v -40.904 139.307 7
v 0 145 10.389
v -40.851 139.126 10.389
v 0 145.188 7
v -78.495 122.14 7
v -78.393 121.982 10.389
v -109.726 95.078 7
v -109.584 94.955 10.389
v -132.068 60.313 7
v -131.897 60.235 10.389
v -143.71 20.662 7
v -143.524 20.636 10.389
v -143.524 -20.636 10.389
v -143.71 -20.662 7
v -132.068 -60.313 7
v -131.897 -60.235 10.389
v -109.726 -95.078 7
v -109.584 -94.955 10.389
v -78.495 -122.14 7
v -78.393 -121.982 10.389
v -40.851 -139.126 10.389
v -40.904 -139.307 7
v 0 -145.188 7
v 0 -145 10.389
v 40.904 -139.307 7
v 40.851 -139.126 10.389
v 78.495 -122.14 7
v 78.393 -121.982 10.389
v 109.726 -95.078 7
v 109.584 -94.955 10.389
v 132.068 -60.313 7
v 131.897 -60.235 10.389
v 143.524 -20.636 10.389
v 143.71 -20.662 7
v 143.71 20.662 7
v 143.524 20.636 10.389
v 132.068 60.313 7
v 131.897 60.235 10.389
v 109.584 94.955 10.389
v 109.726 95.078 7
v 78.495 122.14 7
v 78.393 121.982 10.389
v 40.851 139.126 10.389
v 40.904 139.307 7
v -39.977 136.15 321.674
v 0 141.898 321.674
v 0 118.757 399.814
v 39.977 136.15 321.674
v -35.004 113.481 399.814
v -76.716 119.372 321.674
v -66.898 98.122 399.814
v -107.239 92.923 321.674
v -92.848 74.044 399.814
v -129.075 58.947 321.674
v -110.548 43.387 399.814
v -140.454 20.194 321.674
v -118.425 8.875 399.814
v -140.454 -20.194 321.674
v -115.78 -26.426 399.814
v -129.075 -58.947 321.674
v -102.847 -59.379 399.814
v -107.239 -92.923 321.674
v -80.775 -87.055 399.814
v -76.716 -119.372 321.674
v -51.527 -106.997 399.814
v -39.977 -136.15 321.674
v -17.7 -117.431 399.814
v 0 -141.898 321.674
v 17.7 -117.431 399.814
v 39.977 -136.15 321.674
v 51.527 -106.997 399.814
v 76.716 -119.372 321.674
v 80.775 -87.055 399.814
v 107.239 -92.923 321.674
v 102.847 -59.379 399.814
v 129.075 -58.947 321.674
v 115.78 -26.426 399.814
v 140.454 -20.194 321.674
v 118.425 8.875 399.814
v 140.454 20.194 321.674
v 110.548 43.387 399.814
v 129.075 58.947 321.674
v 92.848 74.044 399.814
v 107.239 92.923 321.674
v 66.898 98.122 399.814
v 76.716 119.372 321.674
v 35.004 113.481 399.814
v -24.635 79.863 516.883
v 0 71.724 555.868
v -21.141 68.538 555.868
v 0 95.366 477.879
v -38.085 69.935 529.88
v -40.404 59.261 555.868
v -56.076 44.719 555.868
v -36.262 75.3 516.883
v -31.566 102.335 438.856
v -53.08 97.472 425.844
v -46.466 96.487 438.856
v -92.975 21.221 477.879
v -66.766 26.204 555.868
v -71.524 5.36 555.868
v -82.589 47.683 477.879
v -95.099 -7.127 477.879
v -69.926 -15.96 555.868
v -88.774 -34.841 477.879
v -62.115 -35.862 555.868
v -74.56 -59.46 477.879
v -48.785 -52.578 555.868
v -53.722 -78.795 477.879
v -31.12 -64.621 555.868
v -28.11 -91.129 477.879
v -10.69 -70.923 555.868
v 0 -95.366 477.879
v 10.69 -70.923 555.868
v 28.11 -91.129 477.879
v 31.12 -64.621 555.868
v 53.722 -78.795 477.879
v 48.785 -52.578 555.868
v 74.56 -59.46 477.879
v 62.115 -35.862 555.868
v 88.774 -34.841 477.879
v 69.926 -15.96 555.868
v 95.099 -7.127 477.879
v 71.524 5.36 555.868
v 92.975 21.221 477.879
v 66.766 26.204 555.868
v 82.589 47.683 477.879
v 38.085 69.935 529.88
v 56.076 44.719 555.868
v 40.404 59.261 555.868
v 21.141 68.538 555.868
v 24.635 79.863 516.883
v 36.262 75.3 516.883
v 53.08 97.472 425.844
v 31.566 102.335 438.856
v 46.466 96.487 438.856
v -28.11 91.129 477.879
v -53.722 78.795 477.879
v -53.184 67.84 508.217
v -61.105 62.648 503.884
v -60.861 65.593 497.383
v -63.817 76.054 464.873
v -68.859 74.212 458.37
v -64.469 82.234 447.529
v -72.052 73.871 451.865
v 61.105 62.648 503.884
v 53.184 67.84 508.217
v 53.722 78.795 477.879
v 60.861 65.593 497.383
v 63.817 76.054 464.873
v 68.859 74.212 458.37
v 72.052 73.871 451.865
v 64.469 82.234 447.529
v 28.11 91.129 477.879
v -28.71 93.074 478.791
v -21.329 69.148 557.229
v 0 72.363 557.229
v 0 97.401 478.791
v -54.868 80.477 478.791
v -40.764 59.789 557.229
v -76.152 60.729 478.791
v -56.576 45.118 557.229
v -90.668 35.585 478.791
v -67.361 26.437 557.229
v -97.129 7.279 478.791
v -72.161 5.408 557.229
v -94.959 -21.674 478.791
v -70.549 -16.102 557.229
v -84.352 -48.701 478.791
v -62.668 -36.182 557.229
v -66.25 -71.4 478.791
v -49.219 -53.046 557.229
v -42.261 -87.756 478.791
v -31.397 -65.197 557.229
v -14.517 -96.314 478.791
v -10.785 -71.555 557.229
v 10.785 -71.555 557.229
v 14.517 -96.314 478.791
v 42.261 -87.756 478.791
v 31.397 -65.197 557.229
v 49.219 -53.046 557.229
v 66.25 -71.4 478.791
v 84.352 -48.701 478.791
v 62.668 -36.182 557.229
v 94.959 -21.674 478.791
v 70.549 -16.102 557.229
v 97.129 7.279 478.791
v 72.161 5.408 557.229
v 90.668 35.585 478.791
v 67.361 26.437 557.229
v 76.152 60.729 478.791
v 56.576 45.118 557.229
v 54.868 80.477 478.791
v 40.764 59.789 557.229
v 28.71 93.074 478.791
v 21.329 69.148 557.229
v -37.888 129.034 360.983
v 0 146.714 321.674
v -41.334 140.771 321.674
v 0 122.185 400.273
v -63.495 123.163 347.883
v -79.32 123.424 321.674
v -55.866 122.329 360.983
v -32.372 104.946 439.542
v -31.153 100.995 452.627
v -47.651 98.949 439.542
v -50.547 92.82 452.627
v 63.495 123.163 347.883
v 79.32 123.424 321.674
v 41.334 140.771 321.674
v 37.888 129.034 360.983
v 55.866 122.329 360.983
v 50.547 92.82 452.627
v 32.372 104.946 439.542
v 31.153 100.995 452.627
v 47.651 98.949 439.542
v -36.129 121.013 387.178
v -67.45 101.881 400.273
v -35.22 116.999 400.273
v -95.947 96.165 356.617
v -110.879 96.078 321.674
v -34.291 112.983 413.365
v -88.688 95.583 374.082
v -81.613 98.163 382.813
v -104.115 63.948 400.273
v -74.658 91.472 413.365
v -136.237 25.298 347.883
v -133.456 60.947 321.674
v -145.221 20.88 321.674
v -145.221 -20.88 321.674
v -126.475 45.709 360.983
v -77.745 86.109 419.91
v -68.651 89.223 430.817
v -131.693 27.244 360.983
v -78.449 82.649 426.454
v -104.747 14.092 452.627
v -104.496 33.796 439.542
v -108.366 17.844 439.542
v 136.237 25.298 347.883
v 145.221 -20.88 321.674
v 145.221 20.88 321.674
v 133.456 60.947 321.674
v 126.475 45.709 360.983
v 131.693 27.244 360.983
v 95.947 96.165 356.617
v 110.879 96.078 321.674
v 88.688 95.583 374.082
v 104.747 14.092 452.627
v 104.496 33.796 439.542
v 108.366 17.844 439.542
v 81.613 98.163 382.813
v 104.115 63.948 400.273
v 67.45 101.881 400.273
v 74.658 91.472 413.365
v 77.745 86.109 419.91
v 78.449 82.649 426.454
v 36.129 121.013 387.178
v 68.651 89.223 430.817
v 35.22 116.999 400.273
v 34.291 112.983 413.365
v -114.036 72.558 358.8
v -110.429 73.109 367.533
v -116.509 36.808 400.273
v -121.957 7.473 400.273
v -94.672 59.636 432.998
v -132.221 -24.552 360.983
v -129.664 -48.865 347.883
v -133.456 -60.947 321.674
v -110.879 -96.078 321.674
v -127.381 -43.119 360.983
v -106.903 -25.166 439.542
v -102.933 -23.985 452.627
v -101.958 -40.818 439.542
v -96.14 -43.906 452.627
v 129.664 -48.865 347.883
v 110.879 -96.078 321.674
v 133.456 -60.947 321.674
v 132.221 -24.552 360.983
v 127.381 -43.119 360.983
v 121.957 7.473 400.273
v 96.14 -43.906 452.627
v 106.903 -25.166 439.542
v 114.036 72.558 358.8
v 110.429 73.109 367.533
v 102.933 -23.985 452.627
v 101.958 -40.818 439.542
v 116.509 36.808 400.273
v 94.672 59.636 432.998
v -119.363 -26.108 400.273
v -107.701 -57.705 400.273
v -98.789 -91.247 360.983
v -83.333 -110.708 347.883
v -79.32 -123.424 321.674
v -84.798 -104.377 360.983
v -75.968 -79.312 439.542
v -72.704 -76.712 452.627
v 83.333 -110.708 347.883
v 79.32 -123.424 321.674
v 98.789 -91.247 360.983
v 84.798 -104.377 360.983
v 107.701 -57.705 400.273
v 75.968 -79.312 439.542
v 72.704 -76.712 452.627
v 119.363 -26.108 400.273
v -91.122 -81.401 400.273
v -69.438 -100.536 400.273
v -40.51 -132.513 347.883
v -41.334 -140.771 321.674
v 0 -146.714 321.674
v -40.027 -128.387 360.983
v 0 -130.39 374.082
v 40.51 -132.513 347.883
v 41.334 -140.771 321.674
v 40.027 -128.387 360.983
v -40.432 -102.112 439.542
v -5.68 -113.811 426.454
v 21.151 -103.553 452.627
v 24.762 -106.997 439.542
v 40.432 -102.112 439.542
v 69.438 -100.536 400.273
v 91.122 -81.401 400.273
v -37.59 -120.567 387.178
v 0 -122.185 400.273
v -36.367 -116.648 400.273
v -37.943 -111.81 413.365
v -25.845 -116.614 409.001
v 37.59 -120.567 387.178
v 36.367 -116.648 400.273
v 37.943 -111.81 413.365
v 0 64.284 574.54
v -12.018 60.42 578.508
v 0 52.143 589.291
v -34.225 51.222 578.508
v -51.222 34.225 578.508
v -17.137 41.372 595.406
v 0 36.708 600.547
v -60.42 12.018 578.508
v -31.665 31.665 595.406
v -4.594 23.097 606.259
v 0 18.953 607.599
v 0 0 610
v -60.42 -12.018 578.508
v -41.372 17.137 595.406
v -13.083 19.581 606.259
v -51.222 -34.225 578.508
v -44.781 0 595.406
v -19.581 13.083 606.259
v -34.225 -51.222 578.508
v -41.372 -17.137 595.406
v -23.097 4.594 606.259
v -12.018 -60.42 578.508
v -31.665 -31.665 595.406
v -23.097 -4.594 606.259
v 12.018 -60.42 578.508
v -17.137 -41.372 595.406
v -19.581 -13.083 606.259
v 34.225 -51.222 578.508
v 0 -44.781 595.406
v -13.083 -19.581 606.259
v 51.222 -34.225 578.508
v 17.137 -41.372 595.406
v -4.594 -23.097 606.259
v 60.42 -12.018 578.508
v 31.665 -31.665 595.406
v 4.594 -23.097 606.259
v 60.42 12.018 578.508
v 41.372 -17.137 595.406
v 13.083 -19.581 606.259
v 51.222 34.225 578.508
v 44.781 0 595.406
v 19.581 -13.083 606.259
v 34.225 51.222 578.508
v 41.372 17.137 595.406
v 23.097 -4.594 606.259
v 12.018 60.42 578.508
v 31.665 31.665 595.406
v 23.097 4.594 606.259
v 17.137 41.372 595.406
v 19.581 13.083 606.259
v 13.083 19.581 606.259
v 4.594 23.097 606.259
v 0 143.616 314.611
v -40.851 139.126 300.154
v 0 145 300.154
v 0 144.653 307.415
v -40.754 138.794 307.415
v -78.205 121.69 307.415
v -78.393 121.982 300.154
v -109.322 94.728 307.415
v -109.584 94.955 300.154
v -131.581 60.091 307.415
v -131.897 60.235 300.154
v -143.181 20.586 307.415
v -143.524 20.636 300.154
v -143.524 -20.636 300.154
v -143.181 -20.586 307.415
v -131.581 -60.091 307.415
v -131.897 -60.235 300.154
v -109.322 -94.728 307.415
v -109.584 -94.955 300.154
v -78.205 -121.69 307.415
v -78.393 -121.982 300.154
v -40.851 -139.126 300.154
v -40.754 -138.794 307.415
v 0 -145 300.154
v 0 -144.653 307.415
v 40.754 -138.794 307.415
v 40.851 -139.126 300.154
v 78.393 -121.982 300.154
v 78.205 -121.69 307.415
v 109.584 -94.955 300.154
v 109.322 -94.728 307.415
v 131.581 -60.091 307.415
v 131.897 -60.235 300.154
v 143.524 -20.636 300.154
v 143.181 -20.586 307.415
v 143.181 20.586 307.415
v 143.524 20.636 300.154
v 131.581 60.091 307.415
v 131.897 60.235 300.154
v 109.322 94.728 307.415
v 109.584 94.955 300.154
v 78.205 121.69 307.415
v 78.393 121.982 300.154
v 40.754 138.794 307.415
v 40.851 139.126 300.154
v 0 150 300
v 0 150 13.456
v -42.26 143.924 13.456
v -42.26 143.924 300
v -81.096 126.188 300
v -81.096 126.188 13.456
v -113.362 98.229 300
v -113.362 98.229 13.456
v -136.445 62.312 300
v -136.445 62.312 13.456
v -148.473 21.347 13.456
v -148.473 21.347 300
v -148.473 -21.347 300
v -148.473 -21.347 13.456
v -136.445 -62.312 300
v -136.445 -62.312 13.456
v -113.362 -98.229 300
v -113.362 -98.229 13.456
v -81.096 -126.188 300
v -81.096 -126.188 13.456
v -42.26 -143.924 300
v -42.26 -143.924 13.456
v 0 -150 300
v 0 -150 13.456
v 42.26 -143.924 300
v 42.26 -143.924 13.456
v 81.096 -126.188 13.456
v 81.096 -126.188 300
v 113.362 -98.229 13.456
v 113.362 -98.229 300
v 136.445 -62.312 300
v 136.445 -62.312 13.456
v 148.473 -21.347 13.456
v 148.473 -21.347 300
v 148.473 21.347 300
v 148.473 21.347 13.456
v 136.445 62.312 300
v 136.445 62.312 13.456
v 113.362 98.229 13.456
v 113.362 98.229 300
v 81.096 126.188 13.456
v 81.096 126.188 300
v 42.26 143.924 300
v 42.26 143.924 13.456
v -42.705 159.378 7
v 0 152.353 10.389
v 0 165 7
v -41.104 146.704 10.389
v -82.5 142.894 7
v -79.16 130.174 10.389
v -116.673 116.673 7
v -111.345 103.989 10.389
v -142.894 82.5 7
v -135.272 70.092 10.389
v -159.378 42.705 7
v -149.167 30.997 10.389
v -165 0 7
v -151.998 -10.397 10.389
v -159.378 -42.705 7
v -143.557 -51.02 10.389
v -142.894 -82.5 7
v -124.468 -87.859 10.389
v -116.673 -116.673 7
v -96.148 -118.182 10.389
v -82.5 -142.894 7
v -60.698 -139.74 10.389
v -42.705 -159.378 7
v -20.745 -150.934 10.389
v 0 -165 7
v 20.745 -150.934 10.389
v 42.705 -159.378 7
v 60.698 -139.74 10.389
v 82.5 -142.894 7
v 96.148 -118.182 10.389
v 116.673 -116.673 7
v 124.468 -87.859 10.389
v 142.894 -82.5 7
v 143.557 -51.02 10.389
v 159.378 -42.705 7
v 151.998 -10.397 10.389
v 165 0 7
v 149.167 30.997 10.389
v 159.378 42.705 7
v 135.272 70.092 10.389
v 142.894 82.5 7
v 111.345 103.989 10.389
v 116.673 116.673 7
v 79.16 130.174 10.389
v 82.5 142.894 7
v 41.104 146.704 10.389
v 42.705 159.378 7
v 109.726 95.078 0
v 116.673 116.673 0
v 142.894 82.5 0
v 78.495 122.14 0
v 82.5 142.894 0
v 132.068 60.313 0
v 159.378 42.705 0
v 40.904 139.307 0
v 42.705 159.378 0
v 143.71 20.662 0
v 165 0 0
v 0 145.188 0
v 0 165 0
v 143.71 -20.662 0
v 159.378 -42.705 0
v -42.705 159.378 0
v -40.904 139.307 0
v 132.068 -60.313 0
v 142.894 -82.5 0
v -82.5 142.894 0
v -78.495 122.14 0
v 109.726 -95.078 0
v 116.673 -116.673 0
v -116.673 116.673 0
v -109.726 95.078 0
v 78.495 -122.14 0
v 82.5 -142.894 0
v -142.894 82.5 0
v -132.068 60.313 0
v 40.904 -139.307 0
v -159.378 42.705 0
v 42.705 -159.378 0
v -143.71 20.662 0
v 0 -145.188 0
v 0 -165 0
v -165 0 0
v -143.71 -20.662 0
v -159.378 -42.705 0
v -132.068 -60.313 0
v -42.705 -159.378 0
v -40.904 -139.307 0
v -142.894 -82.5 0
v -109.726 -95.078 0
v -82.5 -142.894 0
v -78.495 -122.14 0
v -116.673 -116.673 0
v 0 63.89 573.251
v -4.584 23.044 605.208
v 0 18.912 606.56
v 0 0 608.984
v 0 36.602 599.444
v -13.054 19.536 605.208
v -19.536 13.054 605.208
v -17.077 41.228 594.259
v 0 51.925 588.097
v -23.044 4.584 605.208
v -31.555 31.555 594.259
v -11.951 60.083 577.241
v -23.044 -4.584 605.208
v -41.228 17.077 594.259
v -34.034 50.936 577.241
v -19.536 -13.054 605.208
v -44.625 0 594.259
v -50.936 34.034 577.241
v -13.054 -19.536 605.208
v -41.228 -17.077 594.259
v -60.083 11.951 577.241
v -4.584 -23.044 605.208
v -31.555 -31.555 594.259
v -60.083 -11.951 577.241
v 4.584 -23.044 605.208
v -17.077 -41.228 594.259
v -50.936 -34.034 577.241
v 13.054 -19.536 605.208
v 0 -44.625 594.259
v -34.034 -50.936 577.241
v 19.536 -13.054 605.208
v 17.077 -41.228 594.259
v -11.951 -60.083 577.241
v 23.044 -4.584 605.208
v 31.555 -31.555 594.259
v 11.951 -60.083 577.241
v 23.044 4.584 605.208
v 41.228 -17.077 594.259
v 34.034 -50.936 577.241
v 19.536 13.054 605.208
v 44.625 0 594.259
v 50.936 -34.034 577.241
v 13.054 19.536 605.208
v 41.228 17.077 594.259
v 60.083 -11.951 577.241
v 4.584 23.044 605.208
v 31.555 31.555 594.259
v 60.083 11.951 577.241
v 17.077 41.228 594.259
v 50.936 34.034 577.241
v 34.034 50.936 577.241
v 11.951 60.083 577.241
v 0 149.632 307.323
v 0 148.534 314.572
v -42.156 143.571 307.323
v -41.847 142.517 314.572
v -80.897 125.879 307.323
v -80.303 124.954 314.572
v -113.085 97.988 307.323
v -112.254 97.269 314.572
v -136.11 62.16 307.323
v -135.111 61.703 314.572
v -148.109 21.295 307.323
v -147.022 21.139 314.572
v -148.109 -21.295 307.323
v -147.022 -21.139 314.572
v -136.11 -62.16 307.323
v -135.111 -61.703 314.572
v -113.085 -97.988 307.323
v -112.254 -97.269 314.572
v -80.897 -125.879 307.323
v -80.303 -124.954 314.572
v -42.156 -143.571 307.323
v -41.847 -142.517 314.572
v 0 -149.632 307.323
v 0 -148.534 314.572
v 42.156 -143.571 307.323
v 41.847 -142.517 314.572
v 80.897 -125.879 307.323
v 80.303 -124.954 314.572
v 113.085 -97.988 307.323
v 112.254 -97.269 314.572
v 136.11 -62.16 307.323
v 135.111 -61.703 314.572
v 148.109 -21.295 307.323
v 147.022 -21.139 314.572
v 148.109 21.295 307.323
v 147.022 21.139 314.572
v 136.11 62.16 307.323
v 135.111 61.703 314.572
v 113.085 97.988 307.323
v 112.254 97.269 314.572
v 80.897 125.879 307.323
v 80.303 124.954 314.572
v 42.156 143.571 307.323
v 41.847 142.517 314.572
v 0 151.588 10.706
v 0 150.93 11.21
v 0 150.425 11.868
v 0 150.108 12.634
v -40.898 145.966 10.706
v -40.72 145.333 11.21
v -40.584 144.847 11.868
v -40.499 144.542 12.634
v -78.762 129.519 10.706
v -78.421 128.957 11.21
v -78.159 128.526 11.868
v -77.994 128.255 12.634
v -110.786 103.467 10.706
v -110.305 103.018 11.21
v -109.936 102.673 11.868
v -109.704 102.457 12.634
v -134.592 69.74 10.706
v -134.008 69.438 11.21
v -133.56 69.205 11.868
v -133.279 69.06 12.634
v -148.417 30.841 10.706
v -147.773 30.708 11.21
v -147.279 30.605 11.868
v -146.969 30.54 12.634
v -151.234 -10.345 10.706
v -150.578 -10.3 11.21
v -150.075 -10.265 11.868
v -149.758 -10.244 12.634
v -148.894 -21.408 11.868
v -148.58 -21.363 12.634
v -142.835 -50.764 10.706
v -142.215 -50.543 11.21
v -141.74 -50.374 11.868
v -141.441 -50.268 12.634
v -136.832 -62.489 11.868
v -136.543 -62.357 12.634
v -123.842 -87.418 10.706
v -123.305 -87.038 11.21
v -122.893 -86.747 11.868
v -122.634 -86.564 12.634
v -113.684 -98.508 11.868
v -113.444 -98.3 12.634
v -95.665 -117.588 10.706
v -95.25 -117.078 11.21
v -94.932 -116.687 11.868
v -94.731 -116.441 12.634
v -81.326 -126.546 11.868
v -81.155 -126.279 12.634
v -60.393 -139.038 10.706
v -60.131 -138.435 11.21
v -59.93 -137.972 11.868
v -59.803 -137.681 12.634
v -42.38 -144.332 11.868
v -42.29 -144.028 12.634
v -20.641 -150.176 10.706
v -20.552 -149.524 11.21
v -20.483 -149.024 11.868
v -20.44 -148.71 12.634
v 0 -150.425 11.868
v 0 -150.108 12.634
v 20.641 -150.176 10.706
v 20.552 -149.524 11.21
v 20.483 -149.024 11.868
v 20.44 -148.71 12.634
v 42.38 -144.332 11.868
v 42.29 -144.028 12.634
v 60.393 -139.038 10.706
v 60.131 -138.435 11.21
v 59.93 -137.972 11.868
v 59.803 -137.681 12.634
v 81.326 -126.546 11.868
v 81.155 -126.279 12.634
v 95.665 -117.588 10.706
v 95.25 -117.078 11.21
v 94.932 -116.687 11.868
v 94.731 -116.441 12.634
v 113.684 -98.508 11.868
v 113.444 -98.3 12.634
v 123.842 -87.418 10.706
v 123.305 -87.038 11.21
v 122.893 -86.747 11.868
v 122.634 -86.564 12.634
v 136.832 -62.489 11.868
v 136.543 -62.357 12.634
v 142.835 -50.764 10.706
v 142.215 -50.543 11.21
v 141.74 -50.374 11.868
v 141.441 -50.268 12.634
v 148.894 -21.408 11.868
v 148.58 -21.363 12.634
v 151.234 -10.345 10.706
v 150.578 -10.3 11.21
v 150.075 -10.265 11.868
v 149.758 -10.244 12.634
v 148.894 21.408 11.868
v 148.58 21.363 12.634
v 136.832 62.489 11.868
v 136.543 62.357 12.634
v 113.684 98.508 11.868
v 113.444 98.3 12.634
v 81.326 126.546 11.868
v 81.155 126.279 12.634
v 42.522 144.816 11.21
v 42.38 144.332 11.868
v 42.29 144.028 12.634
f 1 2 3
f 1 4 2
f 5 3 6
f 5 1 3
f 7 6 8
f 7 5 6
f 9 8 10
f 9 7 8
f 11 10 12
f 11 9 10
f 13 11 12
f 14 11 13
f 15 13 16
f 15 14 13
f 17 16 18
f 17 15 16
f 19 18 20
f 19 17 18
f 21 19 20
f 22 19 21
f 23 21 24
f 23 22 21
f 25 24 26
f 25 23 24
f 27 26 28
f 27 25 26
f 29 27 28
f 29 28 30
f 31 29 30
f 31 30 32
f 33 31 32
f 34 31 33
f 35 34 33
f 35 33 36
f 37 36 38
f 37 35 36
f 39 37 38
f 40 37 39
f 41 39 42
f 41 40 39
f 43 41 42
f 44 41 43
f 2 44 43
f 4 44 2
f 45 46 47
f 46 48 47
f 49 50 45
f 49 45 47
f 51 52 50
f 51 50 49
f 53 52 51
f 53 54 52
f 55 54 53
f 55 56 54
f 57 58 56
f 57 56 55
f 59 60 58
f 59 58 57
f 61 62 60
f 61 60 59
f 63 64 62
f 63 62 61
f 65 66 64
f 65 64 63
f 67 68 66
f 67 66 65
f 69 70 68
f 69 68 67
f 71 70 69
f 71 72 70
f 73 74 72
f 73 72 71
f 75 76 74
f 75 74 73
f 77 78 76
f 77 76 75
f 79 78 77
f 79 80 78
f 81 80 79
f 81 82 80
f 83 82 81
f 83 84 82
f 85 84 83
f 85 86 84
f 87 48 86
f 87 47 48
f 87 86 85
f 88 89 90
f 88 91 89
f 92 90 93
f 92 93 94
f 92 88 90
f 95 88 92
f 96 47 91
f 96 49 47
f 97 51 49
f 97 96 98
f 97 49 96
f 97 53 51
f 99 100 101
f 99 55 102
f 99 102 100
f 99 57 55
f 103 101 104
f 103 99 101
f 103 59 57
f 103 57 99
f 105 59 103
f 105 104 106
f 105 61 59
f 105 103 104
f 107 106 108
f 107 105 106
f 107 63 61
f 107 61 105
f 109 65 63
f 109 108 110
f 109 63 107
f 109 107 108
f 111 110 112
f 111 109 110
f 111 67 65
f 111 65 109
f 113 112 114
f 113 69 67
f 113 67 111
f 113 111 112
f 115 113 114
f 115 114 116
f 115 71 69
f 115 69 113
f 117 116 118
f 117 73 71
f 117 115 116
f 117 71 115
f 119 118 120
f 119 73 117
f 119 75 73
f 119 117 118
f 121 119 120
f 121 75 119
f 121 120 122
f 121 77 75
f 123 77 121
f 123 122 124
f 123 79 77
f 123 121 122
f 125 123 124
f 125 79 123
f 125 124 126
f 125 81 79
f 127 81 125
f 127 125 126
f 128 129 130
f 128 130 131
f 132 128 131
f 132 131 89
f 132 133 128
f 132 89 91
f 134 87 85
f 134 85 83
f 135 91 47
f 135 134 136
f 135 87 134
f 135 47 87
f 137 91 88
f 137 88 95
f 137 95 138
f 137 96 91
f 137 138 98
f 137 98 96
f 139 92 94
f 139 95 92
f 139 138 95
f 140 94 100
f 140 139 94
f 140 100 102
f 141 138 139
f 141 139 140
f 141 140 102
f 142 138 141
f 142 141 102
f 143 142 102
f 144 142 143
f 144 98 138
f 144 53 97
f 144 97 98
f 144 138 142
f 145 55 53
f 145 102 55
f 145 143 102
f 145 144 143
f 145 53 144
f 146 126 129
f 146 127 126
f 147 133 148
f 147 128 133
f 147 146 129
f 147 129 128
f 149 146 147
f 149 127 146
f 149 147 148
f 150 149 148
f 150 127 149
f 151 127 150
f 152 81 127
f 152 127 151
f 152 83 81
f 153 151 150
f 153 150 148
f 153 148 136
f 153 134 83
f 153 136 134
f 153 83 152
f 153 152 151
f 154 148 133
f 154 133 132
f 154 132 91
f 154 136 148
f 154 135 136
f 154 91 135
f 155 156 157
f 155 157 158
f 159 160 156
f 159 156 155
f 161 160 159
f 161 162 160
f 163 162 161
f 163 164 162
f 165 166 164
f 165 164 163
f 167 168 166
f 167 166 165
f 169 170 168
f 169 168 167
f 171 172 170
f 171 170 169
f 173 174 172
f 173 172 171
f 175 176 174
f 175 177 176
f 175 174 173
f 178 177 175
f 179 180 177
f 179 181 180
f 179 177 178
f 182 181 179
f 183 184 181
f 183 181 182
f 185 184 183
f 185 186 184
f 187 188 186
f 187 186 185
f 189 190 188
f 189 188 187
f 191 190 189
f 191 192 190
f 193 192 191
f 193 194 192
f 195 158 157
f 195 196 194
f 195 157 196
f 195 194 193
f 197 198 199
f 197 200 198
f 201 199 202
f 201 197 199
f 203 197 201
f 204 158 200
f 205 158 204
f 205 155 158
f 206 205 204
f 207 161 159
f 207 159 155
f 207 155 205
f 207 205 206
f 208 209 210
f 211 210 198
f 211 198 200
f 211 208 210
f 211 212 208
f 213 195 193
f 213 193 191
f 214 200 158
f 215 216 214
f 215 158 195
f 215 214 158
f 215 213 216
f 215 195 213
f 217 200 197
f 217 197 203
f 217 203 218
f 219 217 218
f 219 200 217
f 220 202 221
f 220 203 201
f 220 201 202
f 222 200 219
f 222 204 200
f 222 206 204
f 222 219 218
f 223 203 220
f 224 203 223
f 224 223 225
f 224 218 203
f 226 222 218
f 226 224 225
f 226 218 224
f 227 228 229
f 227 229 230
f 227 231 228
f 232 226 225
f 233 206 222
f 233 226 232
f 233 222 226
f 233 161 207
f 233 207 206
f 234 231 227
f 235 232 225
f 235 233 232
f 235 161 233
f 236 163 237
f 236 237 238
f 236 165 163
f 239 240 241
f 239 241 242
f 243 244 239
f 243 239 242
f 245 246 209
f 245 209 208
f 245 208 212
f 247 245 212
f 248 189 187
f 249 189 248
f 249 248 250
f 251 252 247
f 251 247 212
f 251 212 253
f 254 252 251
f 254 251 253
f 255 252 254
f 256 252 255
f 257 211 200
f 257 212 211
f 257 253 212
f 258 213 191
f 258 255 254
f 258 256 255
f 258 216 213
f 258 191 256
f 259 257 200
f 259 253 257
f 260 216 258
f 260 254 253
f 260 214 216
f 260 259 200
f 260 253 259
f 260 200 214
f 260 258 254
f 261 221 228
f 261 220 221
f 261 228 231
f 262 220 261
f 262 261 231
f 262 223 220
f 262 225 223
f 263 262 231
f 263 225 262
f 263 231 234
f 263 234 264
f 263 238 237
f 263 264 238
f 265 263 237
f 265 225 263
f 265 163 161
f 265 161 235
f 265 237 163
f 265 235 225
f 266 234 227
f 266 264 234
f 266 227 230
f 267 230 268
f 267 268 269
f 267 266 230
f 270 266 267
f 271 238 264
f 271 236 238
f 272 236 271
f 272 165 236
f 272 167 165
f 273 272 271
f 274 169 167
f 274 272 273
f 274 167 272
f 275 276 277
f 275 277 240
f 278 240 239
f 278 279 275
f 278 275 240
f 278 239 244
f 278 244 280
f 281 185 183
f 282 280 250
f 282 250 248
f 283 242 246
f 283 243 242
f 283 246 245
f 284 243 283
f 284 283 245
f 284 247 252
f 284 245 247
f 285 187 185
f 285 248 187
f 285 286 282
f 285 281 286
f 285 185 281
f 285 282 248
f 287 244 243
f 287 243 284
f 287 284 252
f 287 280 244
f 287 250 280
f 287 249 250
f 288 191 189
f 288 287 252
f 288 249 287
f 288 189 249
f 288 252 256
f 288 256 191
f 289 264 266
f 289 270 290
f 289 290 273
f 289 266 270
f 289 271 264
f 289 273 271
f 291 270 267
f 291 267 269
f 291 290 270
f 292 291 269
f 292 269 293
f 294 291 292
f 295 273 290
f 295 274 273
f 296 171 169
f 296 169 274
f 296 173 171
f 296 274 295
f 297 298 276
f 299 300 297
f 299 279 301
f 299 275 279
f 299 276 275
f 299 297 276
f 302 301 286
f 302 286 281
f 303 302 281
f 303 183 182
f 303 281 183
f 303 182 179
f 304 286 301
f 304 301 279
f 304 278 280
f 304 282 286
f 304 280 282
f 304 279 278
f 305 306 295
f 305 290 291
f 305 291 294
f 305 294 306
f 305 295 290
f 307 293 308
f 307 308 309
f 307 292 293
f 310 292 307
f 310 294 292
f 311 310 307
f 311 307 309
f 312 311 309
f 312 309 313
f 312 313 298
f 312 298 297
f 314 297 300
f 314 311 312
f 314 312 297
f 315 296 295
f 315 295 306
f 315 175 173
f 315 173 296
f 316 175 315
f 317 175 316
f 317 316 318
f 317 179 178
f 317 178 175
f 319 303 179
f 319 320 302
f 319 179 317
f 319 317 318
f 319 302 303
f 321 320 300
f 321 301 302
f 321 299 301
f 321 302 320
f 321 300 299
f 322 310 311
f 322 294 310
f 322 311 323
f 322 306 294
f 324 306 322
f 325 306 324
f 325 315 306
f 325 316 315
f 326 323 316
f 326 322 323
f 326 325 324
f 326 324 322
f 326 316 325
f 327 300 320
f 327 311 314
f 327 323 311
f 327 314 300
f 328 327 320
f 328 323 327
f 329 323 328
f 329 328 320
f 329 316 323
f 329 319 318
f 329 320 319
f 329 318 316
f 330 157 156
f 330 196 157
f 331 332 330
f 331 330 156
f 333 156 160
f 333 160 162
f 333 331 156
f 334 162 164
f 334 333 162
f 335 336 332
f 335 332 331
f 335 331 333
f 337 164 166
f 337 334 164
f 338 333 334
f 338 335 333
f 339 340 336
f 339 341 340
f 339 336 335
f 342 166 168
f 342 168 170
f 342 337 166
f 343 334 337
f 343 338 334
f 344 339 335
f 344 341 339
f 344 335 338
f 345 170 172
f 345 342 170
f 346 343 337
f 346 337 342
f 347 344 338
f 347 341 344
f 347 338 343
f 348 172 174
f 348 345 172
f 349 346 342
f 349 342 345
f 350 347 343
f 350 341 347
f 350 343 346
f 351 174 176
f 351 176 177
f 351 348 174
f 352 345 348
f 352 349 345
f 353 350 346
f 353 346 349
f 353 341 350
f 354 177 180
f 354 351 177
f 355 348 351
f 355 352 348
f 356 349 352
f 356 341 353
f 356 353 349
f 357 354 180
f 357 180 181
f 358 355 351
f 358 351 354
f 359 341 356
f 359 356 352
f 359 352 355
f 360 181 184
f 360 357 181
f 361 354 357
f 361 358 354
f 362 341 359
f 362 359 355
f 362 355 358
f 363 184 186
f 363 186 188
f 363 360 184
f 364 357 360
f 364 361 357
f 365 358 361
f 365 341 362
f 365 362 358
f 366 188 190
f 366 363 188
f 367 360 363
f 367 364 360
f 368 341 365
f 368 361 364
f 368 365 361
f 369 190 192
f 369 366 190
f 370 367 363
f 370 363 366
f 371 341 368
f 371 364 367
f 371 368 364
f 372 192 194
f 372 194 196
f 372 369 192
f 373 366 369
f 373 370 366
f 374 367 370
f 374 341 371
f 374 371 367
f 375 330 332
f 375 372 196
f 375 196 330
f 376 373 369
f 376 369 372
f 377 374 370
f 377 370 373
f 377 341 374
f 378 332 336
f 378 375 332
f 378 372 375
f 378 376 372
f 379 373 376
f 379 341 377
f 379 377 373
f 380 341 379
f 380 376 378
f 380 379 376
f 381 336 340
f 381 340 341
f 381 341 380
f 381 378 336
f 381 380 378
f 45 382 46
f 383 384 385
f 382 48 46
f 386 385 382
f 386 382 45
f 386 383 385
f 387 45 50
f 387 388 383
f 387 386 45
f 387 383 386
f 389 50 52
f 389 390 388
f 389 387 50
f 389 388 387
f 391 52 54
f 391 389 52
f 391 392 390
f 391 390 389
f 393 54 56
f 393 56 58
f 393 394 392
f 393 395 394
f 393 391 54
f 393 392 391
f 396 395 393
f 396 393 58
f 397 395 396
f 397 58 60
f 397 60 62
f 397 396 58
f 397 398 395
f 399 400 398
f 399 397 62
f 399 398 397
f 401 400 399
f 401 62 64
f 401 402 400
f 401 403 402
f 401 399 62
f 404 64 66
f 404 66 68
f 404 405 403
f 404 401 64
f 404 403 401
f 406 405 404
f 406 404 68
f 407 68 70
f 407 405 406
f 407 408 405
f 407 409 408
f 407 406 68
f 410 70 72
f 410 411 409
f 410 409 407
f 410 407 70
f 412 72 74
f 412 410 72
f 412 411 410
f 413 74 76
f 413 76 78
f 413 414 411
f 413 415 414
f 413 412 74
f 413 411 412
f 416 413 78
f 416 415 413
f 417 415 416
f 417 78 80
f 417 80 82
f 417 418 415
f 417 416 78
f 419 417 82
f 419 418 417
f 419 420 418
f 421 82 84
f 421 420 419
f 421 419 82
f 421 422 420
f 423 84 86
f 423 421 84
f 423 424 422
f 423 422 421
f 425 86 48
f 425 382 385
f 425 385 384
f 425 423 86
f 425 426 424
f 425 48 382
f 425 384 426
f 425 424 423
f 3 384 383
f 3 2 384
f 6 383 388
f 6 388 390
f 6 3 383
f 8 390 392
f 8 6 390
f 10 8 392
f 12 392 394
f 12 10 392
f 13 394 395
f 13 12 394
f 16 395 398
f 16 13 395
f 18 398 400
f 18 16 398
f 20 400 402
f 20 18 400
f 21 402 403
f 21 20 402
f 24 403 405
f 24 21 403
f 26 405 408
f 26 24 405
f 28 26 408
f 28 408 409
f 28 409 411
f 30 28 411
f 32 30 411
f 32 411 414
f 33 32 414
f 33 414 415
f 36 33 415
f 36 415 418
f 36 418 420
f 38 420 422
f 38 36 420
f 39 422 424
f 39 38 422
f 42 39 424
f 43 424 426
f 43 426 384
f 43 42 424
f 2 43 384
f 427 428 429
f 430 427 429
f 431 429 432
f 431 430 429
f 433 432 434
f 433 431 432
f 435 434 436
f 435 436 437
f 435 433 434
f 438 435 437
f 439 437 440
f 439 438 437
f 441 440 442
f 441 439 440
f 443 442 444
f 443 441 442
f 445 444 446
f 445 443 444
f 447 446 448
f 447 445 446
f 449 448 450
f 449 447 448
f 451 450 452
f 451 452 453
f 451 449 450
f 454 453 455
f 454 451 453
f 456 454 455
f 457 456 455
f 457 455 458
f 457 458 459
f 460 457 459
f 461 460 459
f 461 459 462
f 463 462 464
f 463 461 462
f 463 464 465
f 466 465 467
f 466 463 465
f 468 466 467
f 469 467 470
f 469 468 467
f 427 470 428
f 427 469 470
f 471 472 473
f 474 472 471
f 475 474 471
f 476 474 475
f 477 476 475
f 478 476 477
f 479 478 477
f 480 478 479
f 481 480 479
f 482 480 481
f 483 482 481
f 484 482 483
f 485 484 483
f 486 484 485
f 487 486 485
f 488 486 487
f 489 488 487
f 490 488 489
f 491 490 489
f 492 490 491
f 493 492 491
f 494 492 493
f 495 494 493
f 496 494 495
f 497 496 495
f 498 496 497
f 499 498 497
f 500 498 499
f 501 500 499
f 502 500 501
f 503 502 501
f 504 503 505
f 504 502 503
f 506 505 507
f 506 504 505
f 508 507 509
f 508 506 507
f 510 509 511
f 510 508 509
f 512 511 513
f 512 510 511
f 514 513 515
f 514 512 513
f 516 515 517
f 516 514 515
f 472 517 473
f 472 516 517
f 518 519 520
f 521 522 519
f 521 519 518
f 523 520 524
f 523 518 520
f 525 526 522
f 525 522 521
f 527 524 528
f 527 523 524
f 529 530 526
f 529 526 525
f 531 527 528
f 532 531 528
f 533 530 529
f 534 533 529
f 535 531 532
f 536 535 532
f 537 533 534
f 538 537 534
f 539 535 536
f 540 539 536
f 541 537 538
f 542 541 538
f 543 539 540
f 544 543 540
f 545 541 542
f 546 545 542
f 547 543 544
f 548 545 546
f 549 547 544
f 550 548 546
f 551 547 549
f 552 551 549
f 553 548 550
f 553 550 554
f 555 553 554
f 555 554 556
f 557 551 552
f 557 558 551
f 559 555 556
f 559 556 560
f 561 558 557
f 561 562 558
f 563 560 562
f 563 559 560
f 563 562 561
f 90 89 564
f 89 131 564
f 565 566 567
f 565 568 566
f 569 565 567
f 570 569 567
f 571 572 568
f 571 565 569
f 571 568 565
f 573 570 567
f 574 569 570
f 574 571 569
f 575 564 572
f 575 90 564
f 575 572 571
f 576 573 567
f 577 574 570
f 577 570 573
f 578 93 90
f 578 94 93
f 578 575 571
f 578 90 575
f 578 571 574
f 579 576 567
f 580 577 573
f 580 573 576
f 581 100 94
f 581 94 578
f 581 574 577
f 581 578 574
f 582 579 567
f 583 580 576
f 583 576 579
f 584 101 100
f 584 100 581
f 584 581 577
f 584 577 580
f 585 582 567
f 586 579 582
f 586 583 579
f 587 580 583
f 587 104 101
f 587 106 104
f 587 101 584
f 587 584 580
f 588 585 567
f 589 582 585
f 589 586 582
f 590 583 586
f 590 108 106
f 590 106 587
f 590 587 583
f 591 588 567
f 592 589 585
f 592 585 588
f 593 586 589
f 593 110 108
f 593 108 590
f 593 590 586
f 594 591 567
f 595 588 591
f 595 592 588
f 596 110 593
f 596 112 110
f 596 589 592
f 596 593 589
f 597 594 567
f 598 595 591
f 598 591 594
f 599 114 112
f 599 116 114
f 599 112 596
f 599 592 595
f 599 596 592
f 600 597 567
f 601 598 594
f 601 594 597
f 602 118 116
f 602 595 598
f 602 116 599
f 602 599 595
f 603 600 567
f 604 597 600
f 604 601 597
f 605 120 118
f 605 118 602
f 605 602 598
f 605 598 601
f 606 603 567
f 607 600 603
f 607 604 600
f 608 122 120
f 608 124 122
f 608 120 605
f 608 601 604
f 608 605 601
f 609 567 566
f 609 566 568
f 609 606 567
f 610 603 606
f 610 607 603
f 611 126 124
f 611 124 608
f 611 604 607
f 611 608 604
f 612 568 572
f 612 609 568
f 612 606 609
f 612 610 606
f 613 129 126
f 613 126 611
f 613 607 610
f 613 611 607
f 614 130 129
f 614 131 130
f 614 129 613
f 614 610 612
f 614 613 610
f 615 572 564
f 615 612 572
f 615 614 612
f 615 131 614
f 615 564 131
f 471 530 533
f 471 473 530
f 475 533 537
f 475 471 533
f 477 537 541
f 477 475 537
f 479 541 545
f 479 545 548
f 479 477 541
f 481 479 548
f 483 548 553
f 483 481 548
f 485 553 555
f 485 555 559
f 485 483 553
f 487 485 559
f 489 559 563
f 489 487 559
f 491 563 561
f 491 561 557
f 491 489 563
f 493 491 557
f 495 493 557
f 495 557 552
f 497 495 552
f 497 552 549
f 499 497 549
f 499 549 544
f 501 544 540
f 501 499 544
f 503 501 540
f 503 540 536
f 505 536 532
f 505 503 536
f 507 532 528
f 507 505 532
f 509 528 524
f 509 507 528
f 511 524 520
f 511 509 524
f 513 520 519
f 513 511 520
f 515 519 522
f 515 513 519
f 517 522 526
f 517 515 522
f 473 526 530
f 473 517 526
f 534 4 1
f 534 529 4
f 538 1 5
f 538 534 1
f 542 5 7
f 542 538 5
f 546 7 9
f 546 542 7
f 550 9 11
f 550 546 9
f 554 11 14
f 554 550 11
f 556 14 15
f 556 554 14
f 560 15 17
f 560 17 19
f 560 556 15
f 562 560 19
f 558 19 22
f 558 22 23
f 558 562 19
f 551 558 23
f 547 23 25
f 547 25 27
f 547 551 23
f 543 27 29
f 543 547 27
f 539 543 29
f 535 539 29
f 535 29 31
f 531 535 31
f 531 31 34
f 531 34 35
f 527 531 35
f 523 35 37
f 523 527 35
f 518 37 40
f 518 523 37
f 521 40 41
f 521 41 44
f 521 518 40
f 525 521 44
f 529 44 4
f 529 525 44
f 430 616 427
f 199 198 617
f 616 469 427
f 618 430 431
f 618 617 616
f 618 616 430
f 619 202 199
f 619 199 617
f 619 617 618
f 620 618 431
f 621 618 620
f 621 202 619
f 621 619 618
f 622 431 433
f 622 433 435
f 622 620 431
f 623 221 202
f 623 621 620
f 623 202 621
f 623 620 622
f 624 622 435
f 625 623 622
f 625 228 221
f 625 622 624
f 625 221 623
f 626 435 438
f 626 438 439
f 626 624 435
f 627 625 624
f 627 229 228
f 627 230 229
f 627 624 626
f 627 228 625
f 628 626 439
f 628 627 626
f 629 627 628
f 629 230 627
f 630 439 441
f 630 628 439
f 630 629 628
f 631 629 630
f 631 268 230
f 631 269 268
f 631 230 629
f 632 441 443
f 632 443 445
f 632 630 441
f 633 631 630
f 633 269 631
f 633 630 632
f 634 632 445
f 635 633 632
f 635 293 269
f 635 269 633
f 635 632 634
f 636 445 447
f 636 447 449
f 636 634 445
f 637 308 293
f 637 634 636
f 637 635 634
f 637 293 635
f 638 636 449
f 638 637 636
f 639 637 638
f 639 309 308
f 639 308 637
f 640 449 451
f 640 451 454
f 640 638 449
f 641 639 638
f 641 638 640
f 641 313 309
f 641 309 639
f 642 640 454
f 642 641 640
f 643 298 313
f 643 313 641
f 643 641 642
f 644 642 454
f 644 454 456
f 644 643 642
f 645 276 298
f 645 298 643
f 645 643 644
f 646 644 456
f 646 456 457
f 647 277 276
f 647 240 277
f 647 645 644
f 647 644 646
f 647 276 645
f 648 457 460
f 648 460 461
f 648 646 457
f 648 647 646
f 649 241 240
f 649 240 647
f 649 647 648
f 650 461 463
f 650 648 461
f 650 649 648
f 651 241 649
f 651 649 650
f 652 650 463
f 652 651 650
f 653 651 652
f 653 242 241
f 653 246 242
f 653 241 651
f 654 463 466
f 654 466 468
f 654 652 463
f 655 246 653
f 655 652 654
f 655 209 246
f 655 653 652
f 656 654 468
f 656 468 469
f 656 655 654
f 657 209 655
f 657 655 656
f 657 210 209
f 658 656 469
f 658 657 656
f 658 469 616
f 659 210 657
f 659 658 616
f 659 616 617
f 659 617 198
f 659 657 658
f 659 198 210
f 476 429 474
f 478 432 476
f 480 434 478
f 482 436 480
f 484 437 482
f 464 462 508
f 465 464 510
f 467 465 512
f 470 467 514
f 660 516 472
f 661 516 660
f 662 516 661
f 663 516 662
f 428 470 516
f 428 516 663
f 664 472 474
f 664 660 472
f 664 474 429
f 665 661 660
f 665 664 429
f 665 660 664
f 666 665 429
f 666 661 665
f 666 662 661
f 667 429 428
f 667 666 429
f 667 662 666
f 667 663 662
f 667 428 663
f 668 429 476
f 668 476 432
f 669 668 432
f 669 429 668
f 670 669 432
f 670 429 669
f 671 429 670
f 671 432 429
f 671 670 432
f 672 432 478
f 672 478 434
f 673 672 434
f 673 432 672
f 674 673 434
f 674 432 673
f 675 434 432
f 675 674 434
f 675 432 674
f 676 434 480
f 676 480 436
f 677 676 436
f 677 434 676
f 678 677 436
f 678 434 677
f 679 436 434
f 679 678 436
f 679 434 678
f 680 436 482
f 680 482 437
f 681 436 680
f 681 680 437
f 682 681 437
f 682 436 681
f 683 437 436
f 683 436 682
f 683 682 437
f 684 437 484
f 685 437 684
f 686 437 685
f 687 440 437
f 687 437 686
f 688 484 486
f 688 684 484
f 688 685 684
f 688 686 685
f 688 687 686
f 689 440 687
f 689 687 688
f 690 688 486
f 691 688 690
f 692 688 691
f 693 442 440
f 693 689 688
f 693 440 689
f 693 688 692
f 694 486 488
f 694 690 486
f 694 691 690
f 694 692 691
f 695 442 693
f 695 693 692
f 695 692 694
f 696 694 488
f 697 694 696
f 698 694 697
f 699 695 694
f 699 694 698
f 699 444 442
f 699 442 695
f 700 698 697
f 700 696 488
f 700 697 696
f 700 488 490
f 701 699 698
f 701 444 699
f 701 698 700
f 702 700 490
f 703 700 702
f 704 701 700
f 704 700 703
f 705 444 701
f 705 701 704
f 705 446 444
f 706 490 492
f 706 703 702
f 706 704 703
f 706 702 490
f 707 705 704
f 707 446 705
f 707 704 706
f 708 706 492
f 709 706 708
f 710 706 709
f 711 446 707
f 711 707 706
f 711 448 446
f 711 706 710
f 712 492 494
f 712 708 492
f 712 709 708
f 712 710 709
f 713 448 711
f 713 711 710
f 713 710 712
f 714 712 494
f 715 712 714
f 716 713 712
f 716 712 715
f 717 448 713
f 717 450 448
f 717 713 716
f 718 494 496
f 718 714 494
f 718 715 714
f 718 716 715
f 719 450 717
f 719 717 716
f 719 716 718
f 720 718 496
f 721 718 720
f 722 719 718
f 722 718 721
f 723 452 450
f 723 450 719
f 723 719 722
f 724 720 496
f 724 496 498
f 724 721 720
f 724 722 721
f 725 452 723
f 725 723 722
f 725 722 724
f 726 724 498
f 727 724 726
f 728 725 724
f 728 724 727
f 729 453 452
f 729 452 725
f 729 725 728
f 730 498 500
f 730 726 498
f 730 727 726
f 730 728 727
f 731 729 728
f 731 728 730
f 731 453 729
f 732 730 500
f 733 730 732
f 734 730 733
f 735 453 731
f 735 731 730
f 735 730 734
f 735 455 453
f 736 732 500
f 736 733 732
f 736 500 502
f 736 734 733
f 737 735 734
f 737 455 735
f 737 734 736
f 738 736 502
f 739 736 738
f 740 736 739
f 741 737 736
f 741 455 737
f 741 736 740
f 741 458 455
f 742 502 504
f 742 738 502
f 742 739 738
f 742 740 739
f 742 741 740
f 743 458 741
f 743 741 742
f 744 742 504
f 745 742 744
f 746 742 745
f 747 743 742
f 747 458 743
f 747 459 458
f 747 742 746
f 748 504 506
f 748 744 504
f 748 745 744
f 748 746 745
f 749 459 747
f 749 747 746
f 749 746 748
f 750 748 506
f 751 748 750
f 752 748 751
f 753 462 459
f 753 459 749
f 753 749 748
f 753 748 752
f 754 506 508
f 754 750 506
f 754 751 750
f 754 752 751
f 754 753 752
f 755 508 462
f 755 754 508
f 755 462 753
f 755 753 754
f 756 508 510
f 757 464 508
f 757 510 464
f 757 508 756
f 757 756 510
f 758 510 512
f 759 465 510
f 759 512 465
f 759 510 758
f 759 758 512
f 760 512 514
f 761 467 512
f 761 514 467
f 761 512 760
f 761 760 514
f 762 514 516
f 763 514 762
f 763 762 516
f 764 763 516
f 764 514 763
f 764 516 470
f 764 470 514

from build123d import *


with BuildPart() as part:
    # Sketch1 → Revolve2 (revolve)
    with BuildSketch(Plane(origin=(0, 0, 0), x_dir=(0, 0, -1), z_dir=(1, 0, 0))):
        with BuildLine():
            Line((0, 145.188), (0, 165))
            Line((0, 165), (-7, 165))
            Line((-7, 165), (-10.388686575, 152.353249532))
            ThreePointArc((-10.388686575, 152.353249532), (-11.522683536, 150.656103145), (-13.455501073, 150))
            Line((-13.455501073, 150), (-300, 150))
            ThreePointArc((-300, 150), (-310.960991624, 149.173944589), (-321.674372861, 146.714439069))
            ThreePointArc((-321.674372861, 146.714439069), (-439.541828247, 109.825171624), (-557.228519945, 72.363221744))
            ThreePointArc((-557.228519945, 72.363221744), (-595.405893511, 44.780757498), (-610, 0))
            Line((-610, 0), (-608.984, 0))
            ThreePointArc((-608.984, 0), (-594.259282427, 44.625319466), (-555.868158289, 71.724360639))
            ThreePointArc((-555.868158289, 71.724360639), (-438.8556959, 107.09296389), (-321.674372861, 141.898020722))
            ThreePointArc((-321.674372861, 141.898020722), (-311.025475884, 144.220518359), (-300.154164534, 145))
            Line((-300.154164534, 145), (-10.388686575, 145))
            Line((-10.388686575, 145), (-7, 145.188))
            Line((-7, 145.188), (0, 145.188))
        make_face()
    revolve(axis=Axis((0, 0, 0), (0, 0, 1)))


solid = part.part
